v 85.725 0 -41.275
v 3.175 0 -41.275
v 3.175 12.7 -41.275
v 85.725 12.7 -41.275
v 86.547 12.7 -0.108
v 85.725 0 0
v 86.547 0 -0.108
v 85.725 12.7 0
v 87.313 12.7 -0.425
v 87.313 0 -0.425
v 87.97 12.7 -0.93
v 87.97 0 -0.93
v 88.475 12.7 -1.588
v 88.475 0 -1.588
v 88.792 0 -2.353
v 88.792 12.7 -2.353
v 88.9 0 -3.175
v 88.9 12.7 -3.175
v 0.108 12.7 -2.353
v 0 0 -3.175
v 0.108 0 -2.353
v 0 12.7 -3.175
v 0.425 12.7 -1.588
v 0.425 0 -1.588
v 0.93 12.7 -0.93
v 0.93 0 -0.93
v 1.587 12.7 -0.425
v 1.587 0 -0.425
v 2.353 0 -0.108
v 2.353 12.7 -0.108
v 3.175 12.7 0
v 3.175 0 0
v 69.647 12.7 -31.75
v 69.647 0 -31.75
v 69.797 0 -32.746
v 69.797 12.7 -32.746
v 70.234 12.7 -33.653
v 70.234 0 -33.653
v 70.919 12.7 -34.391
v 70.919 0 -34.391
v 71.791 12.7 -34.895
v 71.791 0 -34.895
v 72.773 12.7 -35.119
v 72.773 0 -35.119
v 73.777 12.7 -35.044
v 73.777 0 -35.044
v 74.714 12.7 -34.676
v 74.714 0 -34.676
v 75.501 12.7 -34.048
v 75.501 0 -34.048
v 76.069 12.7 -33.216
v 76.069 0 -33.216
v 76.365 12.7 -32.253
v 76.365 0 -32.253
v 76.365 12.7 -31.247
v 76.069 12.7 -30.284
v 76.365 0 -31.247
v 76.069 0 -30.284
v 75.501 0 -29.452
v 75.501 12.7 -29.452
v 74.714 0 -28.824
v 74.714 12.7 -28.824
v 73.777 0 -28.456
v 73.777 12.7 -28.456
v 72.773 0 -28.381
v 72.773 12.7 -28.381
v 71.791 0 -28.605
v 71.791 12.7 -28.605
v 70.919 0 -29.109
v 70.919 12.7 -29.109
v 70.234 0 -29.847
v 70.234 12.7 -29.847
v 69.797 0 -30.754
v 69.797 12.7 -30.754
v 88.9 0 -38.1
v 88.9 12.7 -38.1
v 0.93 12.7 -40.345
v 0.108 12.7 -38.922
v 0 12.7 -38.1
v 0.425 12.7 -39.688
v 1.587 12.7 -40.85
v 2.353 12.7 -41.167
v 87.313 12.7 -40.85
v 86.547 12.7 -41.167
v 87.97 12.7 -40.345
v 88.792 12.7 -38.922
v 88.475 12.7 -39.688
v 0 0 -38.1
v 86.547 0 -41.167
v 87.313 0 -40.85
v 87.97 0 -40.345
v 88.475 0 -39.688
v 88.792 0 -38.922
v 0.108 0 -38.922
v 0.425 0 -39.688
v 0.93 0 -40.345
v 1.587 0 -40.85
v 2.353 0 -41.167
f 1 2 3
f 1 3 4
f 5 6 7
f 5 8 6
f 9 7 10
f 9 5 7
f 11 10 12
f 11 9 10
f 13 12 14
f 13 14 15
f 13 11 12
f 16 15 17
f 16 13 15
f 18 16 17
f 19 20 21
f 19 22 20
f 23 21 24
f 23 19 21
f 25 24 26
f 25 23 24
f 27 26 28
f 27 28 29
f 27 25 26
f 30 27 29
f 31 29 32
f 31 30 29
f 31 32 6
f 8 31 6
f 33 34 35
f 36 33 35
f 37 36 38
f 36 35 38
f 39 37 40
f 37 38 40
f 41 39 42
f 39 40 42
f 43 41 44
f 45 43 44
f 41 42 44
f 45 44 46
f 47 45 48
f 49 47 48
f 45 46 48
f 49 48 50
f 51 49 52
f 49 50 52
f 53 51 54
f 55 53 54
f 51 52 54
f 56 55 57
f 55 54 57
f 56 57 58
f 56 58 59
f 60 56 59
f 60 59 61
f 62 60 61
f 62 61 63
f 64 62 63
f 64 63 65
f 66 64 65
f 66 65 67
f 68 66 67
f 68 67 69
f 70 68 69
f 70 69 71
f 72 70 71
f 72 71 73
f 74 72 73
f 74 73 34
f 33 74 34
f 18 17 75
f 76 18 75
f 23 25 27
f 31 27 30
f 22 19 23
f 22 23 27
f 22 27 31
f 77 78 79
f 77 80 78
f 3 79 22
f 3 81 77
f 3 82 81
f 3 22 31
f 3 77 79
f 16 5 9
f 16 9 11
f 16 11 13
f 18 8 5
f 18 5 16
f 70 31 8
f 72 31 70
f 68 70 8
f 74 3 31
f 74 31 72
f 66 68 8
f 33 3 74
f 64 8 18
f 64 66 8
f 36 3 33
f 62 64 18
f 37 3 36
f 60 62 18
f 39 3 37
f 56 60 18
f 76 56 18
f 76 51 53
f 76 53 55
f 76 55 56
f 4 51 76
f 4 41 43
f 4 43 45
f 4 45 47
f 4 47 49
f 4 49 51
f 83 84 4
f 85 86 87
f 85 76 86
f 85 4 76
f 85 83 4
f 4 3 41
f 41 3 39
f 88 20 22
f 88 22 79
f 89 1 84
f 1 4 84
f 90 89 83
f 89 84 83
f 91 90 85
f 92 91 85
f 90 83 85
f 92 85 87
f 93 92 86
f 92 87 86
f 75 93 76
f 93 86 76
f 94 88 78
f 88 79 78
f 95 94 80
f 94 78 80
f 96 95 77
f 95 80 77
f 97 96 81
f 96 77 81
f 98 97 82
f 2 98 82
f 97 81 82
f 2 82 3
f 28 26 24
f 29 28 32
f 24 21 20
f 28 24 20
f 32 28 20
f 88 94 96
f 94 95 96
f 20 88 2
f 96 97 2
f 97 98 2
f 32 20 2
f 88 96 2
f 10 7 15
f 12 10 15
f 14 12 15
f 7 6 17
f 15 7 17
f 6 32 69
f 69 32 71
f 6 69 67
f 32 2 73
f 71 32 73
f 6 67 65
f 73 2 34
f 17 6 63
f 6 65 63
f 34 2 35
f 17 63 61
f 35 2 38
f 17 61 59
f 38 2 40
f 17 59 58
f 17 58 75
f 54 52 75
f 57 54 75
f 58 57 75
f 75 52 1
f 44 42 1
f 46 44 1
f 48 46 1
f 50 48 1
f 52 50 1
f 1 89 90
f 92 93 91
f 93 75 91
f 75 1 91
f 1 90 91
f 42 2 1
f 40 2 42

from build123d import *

# Parameters (mm, degrees)
SKETCH1_W               = 88.9
SKETCH1_H               = 41.275
BOSS_EXTRUDE1_DEPTH     = 12.7
F_1_4_CLEARANCE_HOLE1_D = 6.7564
FILLET1_R               = 3.175


with BuildPart() as part:
    # Sketch1 → Boss-Extrude1 (new body)
    with BuildSketch(Plane(origin=(0, 0, 0), x_dir=(1, 0, 0), z_dir=(0, 1, 0))):
        with Locations((44.45, 20.6375)):
            Rectangle(SKETCH1_W, SKETCH1_H)
    extrude(amount=BOSS_EXTRUDE1_DEPTH)

    # 1/4 Clearance Hole1 (through all)
    with Locations(Plane(origin=(0, 12.7, 0), x_dir=(1, 0, 0), z_dir=(0, 1, 0))):
        with Locations((73.025, 31.75)):
            Hole(F_1_4_CLEARANCE_HOLE1_D / 2)

    # Fillet1
    fillet1_edges = [part.edges().sort_by_distance(p)[0] for p in [
        (0, 6.35, -41.275),
        (88.9, 6.35, -41.275),
        (88.9, 6.35, 0),
        (0, 6.35, 0),
    ]]
    fillet(fillet1_edges, radius=FILLET1_R)


solid = part.part
